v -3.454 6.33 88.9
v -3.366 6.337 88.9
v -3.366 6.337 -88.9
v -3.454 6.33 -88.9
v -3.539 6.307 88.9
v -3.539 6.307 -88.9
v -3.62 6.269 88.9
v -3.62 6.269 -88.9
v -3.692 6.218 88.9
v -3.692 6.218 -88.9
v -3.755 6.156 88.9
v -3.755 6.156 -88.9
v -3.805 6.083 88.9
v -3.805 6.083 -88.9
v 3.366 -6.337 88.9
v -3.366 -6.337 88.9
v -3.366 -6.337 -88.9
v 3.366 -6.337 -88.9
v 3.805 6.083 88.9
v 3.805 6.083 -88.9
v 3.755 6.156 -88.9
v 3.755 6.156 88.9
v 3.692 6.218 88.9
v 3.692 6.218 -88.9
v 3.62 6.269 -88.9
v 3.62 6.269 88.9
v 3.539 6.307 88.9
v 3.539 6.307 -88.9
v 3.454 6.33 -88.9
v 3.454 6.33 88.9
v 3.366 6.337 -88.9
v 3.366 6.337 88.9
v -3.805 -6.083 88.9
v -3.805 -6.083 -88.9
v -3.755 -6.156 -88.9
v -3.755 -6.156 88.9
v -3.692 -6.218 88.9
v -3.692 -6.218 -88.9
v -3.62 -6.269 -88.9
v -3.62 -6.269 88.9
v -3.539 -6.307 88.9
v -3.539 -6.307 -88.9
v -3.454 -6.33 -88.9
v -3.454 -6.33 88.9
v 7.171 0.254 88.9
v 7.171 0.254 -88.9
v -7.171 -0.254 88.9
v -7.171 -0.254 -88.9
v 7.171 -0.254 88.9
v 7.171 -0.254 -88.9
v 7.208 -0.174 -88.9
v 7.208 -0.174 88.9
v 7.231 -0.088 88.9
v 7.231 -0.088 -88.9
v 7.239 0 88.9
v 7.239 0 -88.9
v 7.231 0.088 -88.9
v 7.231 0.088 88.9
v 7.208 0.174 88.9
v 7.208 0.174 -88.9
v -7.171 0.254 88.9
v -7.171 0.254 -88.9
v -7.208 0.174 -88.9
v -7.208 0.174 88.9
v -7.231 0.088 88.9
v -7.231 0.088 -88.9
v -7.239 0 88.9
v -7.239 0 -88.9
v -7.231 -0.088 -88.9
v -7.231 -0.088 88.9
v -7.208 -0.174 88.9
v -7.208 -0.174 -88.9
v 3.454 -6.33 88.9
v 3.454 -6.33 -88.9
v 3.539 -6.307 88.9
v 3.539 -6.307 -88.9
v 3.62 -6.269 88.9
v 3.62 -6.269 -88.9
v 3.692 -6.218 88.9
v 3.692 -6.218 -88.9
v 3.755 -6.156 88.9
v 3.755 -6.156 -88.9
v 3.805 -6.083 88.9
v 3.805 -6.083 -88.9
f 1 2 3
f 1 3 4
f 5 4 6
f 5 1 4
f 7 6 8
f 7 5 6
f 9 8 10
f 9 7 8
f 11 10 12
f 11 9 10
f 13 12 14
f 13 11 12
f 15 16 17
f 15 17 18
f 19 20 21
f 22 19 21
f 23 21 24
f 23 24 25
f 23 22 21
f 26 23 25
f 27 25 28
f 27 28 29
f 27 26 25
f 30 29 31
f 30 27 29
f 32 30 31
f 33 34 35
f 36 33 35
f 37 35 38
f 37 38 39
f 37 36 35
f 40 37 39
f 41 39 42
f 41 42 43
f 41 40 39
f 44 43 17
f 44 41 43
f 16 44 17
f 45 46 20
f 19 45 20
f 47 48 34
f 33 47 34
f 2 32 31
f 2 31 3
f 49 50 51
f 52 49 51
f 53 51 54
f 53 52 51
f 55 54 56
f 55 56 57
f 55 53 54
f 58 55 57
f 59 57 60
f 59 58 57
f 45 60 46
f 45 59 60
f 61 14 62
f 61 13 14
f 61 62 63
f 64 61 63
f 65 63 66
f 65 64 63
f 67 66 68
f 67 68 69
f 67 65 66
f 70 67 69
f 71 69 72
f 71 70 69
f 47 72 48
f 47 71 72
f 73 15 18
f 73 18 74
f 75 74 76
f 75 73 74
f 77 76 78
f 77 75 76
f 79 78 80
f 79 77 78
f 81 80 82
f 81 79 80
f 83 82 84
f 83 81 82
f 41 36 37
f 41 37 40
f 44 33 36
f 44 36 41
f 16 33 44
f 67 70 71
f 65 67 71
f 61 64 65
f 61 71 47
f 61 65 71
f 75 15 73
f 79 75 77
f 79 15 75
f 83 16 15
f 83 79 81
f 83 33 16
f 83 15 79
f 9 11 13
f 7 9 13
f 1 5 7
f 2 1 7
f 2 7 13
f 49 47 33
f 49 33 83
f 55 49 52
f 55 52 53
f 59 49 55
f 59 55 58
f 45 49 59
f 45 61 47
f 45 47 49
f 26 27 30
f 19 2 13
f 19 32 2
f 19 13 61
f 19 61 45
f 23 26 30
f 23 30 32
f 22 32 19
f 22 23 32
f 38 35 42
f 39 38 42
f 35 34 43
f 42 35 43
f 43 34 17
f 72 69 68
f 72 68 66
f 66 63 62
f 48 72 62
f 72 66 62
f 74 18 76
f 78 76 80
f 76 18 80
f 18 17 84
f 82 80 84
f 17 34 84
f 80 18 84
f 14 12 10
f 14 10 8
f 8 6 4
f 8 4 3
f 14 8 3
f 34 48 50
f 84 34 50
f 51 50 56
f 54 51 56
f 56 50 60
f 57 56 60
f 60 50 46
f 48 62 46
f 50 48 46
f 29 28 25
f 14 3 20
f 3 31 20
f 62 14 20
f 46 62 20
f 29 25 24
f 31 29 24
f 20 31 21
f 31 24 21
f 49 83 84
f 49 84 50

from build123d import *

# Parameters (mm, degrees)
BOSS_EXTRUDE1_DEPTH = 88.9


with BuildPart() as part:
    # Sketch1 → Boss-Extrude1 (new, symmetric)
    with BuildSketch(Plane.XY):
        with BuildLine():
            Line((-7.171036753, -0.254), (-3.805488829, -6.0833))
            ThreePointArc((-3.805488829, -6.0833), (-3.619547924, -6.269240905), (-3.365547924, -6.3373))
            Line((-3.365547924, -6.3373), (3.365547924, -6.3373))
            ThreePointArc((3.365547924, -6.3373), (3.619547924, -6.269240905), (3.805488829, -6.0833))
            Line((3.805488829, -6.0833), (7.171036753, -0.254))
            ThreePointArc((7.171036753, -0.254), (7.239095848, 0), (7.171036753, 0.254))
            Line((7.171036753, 0.254), (3.805488829, 6.0833))
            ThreePointArc((3.805488829, 6.0833), (3.619547924, 6.269240905), (3.365547924, 6.3373))
            Line((3.365547924, 6.3373), (-3.365547924, 6.3373))
            ThreePointArc((-3.365547924, 6.3373), (-3.619547924, 6.269240905), (-3.805488829, 6.0833))
            Line((-3.805488829, 6.0833), (-7.171036753, 0.254))
            ThreePointArc((-7.171036753, 0.254), (-7.239095848, 0), (-7.171036753, -0.254))
        make_face()
    extrude(amount=BOSS_EXTRUDE1_DEPTH, both=True)


solid = part.part
